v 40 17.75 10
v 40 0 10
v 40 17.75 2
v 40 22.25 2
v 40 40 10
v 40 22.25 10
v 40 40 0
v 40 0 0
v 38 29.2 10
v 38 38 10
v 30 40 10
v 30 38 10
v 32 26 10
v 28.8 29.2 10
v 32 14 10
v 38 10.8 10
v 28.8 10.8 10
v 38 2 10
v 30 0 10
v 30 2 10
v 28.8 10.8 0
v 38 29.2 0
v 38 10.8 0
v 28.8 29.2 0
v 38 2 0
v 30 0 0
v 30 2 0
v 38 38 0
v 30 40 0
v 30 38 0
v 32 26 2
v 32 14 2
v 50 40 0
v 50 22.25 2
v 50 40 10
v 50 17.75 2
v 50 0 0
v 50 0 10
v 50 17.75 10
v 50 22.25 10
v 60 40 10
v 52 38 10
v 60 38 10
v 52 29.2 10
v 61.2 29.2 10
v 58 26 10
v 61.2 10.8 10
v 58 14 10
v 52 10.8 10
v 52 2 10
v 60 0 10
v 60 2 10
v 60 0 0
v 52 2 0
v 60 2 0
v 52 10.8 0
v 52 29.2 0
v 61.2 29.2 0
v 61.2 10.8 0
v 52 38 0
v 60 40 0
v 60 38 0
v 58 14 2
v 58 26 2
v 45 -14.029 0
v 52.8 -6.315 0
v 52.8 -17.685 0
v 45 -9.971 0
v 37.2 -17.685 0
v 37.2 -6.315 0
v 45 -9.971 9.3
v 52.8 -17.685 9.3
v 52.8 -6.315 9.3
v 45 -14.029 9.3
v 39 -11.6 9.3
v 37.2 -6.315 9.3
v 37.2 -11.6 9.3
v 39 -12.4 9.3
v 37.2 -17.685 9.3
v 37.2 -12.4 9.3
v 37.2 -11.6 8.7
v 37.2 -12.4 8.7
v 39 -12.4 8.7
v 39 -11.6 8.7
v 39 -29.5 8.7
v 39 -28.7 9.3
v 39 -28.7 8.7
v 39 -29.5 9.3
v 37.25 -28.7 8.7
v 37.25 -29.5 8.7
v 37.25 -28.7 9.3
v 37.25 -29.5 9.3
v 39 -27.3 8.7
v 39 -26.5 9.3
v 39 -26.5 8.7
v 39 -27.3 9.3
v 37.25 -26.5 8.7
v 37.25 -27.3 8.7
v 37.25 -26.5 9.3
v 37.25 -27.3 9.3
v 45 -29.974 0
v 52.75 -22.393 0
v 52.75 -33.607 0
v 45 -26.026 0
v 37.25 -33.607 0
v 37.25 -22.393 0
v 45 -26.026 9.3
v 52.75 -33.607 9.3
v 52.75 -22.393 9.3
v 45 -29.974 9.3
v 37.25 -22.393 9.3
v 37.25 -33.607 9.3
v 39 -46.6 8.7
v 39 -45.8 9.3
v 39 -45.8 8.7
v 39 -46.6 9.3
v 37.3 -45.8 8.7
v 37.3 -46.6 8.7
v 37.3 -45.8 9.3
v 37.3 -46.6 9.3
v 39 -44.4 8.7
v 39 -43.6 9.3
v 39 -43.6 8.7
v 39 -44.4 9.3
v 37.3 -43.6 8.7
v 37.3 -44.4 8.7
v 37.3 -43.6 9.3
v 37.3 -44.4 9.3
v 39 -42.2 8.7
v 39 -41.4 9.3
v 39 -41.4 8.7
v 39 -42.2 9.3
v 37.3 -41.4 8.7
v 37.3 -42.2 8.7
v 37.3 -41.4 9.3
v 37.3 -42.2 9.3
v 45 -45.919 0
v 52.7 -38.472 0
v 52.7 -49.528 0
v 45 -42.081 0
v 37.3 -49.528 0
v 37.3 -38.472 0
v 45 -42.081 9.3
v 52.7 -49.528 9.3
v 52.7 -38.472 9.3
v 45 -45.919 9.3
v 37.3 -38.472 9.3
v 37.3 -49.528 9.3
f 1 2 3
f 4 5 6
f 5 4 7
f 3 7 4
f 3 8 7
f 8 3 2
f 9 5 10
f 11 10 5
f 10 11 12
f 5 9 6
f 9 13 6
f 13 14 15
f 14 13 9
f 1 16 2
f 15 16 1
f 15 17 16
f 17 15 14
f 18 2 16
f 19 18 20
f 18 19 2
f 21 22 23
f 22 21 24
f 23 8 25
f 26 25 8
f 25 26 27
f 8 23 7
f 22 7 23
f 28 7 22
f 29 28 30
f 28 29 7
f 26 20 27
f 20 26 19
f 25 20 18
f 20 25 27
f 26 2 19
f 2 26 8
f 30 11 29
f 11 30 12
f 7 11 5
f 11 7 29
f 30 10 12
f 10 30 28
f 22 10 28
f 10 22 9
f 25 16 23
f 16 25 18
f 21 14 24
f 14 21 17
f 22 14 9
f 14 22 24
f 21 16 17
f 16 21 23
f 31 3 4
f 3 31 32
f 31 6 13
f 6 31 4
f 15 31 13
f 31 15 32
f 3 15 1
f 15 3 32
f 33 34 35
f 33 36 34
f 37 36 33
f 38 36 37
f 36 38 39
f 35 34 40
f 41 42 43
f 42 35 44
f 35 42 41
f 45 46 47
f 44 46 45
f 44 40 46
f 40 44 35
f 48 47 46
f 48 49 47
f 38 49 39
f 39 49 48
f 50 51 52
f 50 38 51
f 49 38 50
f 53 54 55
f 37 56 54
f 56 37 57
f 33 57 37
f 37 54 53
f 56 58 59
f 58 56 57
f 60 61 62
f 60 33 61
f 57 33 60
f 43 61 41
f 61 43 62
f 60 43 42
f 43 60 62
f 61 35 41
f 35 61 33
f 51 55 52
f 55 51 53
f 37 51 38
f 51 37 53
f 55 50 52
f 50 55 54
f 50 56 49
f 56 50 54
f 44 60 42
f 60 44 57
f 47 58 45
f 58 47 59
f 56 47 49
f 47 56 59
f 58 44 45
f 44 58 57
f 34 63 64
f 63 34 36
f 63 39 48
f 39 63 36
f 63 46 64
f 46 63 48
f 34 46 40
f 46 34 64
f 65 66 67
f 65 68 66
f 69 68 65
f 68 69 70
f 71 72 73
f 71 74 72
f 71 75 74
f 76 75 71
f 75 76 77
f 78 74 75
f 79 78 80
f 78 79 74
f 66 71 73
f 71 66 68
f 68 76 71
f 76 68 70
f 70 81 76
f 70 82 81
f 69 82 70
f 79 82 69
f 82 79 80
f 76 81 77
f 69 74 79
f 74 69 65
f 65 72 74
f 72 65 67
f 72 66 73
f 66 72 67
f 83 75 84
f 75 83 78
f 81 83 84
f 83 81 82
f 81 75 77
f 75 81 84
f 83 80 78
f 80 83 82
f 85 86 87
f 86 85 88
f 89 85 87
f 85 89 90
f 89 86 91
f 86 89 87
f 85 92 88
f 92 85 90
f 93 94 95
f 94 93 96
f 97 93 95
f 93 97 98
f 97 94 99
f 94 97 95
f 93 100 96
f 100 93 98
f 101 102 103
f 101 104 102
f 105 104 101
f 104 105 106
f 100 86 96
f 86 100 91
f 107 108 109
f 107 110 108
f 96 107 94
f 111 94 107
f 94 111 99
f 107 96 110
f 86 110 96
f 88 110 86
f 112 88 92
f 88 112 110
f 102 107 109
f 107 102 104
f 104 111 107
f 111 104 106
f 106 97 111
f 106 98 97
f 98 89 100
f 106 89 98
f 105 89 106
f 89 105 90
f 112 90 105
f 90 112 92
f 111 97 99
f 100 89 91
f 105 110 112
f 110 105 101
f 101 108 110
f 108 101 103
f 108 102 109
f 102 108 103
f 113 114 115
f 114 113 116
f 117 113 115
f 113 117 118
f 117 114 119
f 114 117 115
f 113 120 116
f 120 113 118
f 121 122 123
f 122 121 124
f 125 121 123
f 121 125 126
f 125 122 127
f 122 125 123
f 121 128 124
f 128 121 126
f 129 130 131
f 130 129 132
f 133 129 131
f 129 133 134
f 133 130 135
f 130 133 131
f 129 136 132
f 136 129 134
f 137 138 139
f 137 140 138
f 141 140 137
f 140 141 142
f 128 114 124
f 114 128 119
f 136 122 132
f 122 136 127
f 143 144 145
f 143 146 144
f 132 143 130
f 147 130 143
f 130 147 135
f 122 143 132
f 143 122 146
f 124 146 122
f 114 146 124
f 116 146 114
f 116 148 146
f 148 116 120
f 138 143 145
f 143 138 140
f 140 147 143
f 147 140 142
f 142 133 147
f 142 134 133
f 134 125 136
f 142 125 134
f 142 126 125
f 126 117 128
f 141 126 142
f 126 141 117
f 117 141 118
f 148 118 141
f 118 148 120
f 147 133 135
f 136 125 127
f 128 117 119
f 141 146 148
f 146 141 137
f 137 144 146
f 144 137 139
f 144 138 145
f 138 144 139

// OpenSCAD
// Modular desk organizer: butterfly-key joint coupon (2026-11-24).
// Scott picked butterfly keys (2026-11-24) from the five in OPTIONS.md. Before any module is
// built, this sets the key's fit (ENGINEERING.md, handbook section 7: the joint first).
//
// Print: two copies of `block` (the second turned round so the pockets face) and three keys,
// one per clearance, marked by notches in the key's top: one notch 0.2, two 0.25, three 0.3.
// The block is one grid unit (40 mm) of a module's 2.0 wall, with the pocket's boss exactly as
// every module will carry it.
//
//   part = block | key_0.2 | key_0.25 | key_0.3 | plate (all five, laid out) | joined (preview)

part = "plate";
U = 40;            // the grid unit
BH = 10;           // the coupon block's height: the pocket and a 2 mm floor under it
WALL = 2.0;        // five beads
FLOOR = 1.6;
R = 4;
// the key: a bow-tie, waist at the joint. The flanks run 25 deg off the key's length:
// play along the joint is clearance / sin(flank) at each pocket, so a steep flank keeps the
// modules tight (17 deg in the concept sketch gave 3.3 x clearance a pocket; 25 deg gives 2.4 x)
KEY_L = 16;        // across the joint: 8 into each module
KEY_W = 12;        // the wings' width
KEY_N = 4.5;       // the waist
KEY_D = 8;         // the pocket's depth: 16 on a real module; the fit is the same at 8, and
                   // at 16 the coupon plate sliced at 42 m, over the 30-minute limit
KEY_PROUD = 1.5;   // the key stands this far above the rim: a fingernail lifts it out
BOSS = 3.2;        // wall round the pocket, eight beads
$fn = 48;

module rbox(w, d, h, r = R) linear_extrude(h) offset(r) offset(-r) square([w, d]);
module key2d(cl = 0) offset(delta = cl) polygon([[-KEY_L / 2, -KEY_W / 2], [-KEY_L / 2, KEY_W / 2], [0, KEY_N / 2],
                                                 [KEY_L / 2, KEY_W / 2], [KEY_L / 2, -KEY_W / 2], [0, -KEY_N / 2]]);

// one grid unit's wall, the pocket on its +x face at the unit's middle: the module's wall and
// the boss exactly as a module carries them, without the rest of the bin (a whole 40 x 40 bin
// pair sliced at 1 h 22 m, over the 30-minute coupon limit). Two 10 mm returns keep it standing.
module block() difference() {
    union() {
        translate([U - WALL, 0, 0]) cube([WALL, U, BH]);
        for (y = [0, U - WALL]) translate([U - 10, y, 0]) cube([10, WALL, BH]);
        translate([U - KEY_L / 2 - BOSS, U / 2 - KEY_W / 2 - BOSS, 0]) cube([KEY_L / 2 + BOSS, KEY_W + 2 * BOSS, BH]);
    }
    translate([U, U / 2, BH - KEY_D]) linear_extrude(KEY_D + 1) key2d(0);   // cut at nominal: the key carries the clearance
}

// the key, shrunk by its clearance all round; notches in its top say which
module key(cl) difference() {
    linear_extrude(KEY_D + KEY_PROUD - 0.2) key2d(-cl);
    n = round((cl - 0.15) / 0.05);
    for (k = [1 : n]) translate([-KEY_L / 2 - 1, (k - (n + 1) / 2) * 2.2 - 0.4, KEY_D + KEY_PROUD - 0.8]) cube([3, 0.8, 1]);
}

if      (part == "block") block();
else if (part == "key_0.2") key(0.2);
else if (part == "key_0.25") key(0.25);
else if (part == "key_0.3") key(0.3);
else if (part == "plate") {
    block();
    translate([2 * U + 10, U, 0]) rotate(180) block();
    for (i = [0 : 2]) translate([U + 5, -12 - 16 * i, 0]) key([0.2, 0.25, 0.3][i]);
}
else if (part == "joined") {
    color("#EDE8DC") block();
    color("#9EB898") translate([2 * U, U, 0]) rotate(180) block();
    color("#C83238") translate([U, U / 2, BH - KEY_D + 0.2]) key(0.25);
}
